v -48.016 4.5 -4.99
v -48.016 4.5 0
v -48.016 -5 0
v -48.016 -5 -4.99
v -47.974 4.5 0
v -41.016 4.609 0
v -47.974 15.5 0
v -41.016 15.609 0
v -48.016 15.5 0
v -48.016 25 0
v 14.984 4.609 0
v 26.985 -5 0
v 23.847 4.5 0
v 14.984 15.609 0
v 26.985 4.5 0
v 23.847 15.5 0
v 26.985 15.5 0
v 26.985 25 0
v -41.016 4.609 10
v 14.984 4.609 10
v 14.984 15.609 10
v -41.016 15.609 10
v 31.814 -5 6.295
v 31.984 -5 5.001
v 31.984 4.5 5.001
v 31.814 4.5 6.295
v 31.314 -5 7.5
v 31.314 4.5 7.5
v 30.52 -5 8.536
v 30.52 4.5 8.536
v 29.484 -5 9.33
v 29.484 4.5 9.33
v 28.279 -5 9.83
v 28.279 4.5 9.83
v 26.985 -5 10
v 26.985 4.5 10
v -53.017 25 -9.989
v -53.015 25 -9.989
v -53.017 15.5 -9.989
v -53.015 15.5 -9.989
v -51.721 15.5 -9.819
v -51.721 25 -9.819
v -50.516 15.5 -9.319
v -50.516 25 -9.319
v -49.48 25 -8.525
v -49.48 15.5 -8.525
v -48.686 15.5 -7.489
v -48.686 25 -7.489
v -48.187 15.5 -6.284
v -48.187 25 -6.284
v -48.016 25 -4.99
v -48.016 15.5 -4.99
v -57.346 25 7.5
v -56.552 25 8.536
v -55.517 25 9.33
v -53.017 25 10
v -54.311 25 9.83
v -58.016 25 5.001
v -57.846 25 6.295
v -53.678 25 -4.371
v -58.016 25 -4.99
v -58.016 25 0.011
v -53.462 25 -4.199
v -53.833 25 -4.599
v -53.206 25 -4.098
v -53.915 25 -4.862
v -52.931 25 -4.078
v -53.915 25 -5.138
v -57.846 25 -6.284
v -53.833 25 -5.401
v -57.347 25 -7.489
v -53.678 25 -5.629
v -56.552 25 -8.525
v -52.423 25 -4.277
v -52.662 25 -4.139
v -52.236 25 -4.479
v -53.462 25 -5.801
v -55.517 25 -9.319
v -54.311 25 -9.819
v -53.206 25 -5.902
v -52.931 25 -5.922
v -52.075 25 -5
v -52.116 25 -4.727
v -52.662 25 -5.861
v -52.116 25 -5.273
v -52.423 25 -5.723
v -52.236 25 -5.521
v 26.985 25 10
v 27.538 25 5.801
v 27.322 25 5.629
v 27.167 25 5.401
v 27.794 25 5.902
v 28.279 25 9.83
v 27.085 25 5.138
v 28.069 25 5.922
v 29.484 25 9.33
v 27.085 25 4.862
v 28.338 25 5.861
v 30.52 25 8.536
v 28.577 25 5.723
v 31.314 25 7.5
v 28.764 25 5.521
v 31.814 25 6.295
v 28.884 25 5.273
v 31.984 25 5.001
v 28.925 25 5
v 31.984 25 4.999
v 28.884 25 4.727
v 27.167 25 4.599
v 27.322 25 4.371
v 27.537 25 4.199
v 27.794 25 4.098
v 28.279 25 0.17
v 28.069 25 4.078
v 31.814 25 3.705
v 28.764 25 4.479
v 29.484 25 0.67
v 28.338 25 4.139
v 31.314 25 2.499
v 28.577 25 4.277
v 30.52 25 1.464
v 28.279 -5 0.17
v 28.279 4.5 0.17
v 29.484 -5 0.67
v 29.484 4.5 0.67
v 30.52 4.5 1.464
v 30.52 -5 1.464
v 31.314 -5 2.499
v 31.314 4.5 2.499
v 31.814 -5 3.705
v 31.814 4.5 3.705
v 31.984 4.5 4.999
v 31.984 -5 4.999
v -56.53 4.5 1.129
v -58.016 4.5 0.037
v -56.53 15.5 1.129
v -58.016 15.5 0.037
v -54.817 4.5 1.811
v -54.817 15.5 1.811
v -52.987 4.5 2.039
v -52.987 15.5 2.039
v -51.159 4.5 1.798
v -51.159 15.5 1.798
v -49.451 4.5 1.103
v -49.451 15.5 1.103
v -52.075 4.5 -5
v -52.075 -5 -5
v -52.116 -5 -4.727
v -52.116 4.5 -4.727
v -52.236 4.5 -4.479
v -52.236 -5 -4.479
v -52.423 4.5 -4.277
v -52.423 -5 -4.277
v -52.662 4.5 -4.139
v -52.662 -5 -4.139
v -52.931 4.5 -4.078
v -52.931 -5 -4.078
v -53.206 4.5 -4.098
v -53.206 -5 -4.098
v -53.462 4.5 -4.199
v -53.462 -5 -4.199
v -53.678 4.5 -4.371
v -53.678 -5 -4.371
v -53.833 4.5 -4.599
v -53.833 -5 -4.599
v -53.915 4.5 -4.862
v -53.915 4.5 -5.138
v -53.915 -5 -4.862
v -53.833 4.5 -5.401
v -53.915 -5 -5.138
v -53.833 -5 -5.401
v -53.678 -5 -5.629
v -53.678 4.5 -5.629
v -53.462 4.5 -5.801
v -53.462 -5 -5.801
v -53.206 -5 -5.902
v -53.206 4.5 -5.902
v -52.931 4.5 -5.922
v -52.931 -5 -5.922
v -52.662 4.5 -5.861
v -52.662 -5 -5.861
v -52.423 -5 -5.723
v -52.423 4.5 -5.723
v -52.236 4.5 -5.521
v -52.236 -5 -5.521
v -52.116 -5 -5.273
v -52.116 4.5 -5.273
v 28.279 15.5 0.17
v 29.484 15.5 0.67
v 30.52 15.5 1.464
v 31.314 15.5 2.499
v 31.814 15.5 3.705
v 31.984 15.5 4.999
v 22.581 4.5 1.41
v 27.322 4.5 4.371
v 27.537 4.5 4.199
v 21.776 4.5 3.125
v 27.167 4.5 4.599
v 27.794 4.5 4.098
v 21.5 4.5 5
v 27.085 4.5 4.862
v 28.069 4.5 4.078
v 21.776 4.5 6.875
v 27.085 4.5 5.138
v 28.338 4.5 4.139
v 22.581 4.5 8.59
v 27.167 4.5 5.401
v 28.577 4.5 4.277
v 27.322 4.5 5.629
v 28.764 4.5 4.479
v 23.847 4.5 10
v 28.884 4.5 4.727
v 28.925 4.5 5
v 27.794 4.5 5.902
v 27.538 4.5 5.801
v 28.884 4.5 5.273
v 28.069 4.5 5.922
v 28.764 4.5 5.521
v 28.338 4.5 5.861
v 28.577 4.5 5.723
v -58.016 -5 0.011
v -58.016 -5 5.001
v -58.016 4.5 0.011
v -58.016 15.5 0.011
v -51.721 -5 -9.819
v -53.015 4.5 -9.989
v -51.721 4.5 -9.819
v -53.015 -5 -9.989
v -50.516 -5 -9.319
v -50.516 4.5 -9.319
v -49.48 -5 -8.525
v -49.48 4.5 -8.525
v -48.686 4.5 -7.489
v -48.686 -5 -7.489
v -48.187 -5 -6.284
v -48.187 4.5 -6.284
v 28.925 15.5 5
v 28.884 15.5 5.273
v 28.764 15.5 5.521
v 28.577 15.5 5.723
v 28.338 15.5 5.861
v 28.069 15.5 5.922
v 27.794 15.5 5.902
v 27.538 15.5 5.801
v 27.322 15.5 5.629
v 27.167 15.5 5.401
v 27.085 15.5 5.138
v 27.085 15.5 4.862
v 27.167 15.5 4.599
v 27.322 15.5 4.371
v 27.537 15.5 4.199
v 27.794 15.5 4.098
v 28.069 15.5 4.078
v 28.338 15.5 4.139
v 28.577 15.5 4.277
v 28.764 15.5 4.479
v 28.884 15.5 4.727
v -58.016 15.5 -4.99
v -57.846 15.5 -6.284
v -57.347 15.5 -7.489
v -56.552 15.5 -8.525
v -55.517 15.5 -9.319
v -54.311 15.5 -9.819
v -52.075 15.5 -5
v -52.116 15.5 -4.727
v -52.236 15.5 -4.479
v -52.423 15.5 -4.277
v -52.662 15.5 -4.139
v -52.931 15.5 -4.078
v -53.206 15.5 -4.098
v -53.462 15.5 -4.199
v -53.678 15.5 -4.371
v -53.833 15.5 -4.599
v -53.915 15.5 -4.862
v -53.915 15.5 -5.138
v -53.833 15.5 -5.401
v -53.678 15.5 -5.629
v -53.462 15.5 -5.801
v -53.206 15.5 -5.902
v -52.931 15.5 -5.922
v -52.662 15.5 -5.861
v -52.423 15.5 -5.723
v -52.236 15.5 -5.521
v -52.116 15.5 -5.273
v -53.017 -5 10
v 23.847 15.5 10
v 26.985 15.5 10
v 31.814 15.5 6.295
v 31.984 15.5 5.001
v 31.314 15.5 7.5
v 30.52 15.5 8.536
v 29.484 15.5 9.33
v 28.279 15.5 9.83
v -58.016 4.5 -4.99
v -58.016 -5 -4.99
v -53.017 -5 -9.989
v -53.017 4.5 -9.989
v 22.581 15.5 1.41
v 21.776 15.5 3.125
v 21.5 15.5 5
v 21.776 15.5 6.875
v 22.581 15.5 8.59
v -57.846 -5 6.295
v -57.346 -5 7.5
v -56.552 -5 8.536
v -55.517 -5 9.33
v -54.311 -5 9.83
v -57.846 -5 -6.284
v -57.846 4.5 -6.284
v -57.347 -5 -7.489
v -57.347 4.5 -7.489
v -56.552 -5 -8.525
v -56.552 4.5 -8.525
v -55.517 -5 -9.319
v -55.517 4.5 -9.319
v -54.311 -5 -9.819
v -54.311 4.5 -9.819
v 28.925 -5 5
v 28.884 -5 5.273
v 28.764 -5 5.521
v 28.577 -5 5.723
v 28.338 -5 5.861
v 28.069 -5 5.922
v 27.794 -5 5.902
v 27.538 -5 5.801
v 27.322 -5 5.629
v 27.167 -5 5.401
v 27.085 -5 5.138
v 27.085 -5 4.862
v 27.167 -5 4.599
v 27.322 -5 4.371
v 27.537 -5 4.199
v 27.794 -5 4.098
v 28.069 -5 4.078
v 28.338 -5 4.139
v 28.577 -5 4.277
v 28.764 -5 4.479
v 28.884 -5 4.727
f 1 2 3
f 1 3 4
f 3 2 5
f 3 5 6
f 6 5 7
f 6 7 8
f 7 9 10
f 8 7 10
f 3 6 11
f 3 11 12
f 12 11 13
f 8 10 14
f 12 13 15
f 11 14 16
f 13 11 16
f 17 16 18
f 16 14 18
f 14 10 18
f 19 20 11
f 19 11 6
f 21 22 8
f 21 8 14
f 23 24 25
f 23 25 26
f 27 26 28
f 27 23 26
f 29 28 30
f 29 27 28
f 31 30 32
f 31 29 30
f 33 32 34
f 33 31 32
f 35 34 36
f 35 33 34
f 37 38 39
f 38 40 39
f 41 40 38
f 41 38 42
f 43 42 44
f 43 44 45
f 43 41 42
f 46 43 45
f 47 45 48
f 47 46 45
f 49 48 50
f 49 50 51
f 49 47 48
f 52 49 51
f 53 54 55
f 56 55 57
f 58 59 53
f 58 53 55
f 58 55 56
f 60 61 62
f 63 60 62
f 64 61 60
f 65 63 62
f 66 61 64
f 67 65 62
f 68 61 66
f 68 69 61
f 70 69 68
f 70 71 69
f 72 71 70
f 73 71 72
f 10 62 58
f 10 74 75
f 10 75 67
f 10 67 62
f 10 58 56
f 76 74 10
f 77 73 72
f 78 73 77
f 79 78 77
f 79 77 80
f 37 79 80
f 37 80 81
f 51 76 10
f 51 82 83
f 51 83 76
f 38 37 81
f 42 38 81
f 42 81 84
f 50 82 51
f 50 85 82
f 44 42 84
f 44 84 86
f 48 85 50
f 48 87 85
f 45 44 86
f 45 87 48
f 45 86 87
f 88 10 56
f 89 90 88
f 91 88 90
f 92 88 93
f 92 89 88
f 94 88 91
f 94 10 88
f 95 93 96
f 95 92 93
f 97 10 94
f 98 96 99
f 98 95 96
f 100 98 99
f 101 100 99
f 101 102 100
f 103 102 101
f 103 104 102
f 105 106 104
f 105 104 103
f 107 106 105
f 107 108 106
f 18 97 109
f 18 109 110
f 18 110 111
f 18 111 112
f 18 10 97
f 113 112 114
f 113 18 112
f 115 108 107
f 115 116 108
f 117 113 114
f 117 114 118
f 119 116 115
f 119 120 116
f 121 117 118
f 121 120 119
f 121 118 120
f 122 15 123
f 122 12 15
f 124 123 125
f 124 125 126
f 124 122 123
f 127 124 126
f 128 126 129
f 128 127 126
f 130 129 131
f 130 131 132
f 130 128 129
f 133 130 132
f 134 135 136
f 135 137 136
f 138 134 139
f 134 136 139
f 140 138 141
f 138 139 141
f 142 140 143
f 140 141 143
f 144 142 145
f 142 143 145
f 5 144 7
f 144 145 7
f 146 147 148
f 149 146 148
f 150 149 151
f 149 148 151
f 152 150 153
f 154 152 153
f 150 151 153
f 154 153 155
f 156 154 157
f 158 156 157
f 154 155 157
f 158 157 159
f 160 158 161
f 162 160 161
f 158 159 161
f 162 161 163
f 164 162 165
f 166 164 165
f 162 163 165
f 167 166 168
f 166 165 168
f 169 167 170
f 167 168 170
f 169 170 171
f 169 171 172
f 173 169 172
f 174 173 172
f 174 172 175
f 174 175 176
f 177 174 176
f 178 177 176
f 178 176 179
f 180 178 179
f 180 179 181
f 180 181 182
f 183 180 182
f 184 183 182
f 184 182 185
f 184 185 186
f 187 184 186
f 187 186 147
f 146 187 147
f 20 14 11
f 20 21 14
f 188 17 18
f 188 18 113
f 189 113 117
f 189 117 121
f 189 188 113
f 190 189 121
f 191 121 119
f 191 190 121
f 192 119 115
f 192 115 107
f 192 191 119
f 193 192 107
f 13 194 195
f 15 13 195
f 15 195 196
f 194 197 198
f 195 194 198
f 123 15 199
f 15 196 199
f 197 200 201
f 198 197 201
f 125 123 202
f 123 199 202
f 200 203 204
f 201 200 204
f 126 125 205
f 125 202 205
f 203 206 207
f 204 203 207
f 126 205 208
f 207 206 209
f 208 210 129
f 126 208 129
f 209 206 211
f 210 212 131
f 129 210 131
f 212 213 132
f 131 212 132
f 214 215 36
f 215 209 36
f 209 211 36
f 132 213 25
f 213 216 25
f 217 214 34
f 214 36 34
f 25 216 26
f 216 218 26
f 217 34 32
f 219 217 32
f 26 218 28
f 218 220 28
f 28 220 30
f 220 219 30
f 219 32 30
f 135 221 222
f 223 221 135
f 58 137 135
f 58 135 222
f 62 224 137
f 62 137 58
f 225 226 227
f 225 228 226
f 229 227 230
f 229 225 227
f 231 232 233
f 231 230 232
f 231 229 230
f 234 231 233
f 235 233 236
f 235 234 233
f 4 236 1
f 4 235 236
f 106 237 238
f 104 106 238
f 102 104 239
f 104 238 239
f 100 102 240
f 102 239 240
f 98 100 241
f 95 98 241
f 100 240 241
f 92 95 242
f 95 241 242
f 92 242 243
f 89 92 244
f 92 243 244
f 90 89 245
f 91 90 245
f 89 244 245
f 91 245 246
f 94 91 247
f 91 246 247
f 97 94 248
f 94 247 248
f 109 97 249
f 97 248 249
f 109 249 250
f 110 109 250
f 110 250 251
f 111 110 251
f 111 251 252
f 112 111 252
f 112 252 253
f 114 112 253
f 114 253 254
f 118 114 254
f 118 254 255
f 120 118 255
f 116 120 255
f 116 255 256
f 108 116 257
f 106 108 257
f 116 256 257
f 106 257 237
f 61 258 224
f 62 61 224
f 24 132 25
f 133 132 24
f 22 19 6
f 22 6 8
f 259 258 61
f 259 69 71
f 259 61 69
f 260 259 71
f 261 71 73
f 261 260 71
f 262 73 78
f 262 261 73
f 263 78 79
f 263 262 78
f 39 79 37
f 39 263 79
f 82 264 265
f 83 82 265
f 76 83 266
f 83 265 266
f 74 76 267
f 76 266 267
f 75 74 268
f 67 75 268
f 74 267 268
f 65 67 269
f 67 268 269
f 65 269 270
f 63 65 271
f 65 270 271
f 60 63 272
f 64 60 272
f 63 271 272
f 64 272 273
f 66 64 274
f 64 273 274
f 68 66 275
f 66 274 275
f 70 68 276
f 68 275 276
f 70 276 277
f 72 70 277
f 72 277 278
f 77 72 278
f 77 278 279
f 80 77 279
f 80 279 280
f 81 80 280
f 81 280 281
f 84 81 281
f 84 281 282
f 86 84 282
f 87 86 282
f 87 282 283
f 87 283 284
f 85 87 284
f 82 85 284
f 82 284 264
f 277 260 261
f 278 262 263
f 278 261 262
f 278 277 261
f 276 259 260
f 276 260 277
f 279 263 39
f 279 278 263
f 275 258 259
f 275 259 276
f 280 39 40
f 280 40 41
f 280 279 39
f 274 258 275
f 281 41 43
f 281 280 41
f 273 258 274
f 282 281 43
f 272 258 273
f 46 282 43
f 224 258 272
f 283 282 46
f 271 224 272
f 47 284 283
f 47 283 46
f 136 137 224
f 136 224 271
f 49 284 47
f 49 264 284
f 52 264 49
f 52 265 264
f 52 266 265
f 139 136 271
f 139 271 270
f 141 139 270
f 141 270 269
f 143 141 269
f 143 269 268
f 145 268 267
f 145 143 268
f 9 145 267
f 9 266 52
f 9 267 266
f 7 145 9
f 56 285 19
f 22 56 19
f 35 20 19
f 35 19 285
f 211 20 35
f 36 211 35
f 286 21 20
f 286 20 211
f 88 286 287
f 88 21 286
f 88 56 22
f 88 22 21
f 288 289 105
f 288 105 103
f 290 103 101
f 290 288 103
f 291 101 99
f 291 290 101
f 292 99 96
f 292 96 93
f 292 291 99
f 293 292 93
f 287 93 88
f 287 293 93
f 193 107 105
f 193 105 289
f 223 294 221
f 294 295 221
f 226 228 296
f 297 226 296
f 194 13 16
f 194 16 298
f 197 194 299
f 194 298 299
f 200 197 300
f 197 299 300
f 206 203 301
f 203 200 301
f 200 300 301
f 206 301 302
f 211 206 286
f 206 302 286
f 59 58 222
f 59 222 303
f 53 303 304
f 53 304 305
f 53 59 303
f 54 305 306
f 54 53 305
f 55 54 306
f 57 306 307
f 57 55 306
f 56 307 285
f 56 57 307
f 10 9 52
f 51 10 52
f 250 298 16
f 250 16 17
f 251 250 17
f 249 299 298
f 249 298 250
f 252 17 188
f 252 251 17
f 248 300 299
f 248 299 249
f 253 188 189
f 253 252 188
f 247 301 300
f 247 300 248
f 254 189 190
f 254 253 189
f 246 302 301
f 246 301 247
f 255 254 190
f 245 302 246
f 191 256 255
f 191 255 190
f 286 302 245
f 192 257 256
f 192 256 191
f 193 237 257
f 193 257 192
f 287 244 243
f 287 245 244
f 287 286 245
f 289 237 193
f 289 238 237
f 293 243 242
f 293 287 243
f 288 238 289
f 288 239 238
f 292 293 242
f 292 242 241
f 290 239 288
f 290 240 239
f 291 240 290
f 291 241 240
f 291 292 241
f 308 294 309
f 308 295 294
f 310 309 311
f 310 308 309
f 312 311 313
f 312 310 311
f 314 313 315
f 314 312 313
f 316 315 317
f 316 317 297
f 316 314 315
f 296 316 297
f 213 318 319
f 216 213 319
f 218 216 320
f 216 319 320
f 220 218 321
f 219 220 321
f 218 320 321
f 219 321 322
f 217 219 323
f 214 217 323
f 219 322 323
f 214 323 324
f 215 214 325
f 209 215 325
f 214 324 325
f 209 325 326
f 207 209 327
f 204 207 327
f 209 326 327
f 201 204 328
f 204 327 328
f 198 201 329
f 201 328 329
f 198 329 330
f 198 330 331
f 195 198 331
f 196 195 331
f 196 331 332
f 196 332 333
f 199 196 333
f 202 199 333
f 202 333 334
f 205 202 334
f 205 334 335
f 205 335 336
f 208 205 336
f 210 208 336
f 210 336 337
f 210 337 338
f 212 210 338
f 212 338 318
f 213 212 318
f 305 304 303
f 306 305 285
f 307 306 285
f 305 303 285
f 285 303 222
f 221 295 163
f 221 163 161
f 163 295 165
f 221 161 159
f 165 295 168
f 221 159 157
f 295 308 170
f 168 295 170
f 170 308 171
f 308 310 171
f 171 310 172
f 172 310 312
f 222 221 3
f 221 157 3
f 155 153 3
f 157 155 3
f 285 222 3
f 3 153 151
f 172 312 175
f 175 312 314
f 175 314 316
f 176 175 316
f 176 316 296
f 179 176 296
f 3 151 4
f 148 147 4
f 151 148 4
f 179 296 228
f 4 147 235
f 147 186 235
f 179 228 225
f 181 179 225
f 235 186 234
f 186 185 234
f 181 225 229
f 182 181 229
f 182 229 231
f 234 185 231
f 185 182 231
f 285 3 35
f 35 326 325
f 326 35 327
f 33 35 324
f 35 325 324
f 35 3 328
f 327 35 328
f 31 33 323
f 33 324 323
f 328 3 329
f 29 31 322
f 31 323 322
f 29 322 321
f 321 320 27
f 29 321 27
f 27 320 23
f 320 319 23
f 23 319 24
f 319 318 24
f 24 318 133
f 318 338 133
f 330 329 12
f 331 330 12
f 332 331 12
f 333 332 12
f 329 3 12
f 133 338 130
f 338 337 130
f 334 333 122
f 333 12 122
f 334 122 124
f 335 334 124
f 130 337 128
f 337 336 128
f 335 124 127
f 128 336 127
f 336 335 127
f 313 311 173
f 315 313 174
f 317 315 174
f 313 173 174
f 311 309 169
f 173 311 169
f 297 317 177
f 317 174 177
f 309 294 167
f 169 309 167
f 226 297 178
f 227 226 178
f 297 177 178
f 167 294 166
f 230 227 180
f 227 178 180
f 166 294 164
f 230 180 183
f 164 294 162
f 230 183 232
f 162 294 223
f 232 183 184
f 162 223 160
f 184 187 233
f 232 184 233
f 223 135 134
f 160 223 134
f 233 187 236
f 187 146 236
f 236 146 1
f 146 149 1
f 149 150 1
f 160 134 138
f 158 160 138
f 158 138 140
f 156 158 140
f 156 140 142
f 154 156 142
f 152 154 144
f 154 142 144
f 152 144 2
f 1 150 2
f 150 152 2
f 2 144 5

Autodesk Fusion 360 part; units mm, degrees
sketch "Esquisse1" plane through (0, 0, 0) normal (0, 0, 1) x (1, 0, 0)
  line L0 (-58.016, 25) -> (31.984, 25)
  line L1 (31.984, 25) -> (31.984, -5)
  line L2 (31.984, -5) -> (-58.016, -5)
  line L3 (-58.016, -5) -> (-58.016, 25)
  dimension "d1" = 90
  dimension "d2" = 30
extrude "Extrusion1" add sketch "Esquisse1" along normal blind 10
sketch "Esquisse11" plane through (0, 0, 0) normal (0, 1, 0) x (1, 0, 0)
  line L0 (-58.0163, -0.0111) -> (-48.0163, -0.0111)
  line L1 (-48.0163, -0.0111) -> (-48.0163, 9.9889)
  line L2 (-48.0163, 9.9889) -> (-58.0163, 9.9889)
  line L3 (-58.0163, 9.9889) -> (-58.0163, -0.0111)
  dimension "d56" = 10
  dimension "d57" = 10
extrude "Extrusion7" add sketch "Esquisse11" along normal blind 25 and the other way blind 5
sketch "Esquisse5" plane through (0, -5, 0) normal (0, -1, 0) x (1, 0, 0)
  line L0 (-48.0163, 0) -> (31.984, 0)
  line L1 (31.984, 0) -> (31.984, 10)
  line L2 (31.984, 10) -> (-58.016, 10)
  line L3 (-58.016, 10) -> (-58.016, 0.0111)
  circle A0 centre (28, 5) radius 6.5
  circle A1 centre (-53.0143, -5.2112) radius 7.25
  line L4 (-58.0163, 0.0111) -> (-58.0163, -9.9889)
  line L5 (-58.0163, -9.9889) -> (-48.0163, -9.9889)
  line L6 (-48.0163, -9.9889) -> (-48.0163, 0)
  line L7 (-58.016, 0.0111) -> (-58.0163, 0.0111)
  dimension "d11" = 13
  dimension "d46" = 14.5
sketch "Esquisse7" plane through (0, 0, 10) normal (0, 0, 1) x (-1, 0, 0)
  line L0 (-31.984, 5) -> (-31.984, -25)
  line L1 (-31.984, -25) -> (58.016, -25)
  line L2 (58.016, 5) -> (-31.984, 5)
  line L3 (41.016, -15.609) -> (-14.984, -15.609)
  line L4 (-14.984, -15.609) -> (-14.984, -4.609)
  line L5 (-14.984, -4.609) -> (41.016, -4.609)
  line L6 (41.016, -4.609) -> (41.016, -15.609)
  line L7 (58.016, -25) -> (58.016, 5)
  dimension "d47" = 11
  dimension "d48" = 56
  dimension "d49" = 17
extrude "Extrusion9" cut sketch "Esquisse5" along normal blind -9.5 and the other way blind 20.5 contours L0 L3 A1 L4 L5 L6 | L0 L3 A1 L4 L5 L6 | L0 L1 L2 A0 picked at (28.4893, 5)
extrude "Extrusion4" cut sketch "Esquisse7" along normal blind 0 and the other way blind 10 contours L3 L4 L5 L6
sketch "Esquisse8" plane through (0, -5, 0) normal (0, -1, 0) x (1, 0, 0)
  line L0 (-48.0163, 0) -> (31.984, 0)
  line L1 (31.984, 0) -> (31.984, 10)
  line L2 (31.984, 10) -> (-58.016, 10)
  line L3 (-58.016, 10) -> (-58.016, 0.0111)
  circle A0 centre (-53, -5) radius 0.925
  line L4 (-58.016, 0.0111) -> (-58.0163, 0.0111)
  line L5 (-58.0163, 0.0111) -> (-58.0163, -9.9889)
  line L6 (-58.0163, -9.9889) -> (-48.0163, -9.9889)
  line L7 (-48.0163, -9.9889) -> (-48.0163, 0)
  dimension "d23" = 1.85
extrude "Extrusion5" cut sketch "Esquisse8" along normal blind 0 and the other way blind 30 contours A0
sketch "Esquisse9" plane through (0, -5, 0) normal (0, -1, 0) x (1, 0, 0)
  circle A0 centre (-53, -5) radius 0.925
  line L0 (-48.0163, 0) -> (31.984, 0)
  line L1 (31.984, 0) -> (31.984, 10)
  line L2 (31.984, 10) -> (-58.016, 10)
  line L3 (-58.016, 10) -> (-58.016, 0.0111)
  circle A1 centre (28, 5) radius 0.925
  line L4 (-58.016, 0.0111) -> (-58.0163, 0.0111)
  line L5 (-58.0163, 0.0111) -> (-58.0163, -9.9889)
  line L6 (-58.0163, -9.9889) -> (-48.0163, -9.9889)
  line L7 (-48.0163, -9.9889) -> (-48.0163, 0)
  dimension "d28" = 1.85
extrude "Extrusion6" cut sketch "Esquisse9" along normal blind 0 and the other way blind 30 contours A1
fillet "Congé8" radius 5 4 edges at (-58.0163, 20.25, -9.9889) (-58.0163, -0.25, -9.9889) (-48.0163, -0.25, -9.9889) (-48.0163, 20.25, -9.9889)
fillet "Congé9" radius 5 5 edges at (-58.016, 10, 10) (31.984, 20.25, 0) (31.984, -0.25, 0) (31.984, -0.25, 10) (31.984, 20.25, 10)
